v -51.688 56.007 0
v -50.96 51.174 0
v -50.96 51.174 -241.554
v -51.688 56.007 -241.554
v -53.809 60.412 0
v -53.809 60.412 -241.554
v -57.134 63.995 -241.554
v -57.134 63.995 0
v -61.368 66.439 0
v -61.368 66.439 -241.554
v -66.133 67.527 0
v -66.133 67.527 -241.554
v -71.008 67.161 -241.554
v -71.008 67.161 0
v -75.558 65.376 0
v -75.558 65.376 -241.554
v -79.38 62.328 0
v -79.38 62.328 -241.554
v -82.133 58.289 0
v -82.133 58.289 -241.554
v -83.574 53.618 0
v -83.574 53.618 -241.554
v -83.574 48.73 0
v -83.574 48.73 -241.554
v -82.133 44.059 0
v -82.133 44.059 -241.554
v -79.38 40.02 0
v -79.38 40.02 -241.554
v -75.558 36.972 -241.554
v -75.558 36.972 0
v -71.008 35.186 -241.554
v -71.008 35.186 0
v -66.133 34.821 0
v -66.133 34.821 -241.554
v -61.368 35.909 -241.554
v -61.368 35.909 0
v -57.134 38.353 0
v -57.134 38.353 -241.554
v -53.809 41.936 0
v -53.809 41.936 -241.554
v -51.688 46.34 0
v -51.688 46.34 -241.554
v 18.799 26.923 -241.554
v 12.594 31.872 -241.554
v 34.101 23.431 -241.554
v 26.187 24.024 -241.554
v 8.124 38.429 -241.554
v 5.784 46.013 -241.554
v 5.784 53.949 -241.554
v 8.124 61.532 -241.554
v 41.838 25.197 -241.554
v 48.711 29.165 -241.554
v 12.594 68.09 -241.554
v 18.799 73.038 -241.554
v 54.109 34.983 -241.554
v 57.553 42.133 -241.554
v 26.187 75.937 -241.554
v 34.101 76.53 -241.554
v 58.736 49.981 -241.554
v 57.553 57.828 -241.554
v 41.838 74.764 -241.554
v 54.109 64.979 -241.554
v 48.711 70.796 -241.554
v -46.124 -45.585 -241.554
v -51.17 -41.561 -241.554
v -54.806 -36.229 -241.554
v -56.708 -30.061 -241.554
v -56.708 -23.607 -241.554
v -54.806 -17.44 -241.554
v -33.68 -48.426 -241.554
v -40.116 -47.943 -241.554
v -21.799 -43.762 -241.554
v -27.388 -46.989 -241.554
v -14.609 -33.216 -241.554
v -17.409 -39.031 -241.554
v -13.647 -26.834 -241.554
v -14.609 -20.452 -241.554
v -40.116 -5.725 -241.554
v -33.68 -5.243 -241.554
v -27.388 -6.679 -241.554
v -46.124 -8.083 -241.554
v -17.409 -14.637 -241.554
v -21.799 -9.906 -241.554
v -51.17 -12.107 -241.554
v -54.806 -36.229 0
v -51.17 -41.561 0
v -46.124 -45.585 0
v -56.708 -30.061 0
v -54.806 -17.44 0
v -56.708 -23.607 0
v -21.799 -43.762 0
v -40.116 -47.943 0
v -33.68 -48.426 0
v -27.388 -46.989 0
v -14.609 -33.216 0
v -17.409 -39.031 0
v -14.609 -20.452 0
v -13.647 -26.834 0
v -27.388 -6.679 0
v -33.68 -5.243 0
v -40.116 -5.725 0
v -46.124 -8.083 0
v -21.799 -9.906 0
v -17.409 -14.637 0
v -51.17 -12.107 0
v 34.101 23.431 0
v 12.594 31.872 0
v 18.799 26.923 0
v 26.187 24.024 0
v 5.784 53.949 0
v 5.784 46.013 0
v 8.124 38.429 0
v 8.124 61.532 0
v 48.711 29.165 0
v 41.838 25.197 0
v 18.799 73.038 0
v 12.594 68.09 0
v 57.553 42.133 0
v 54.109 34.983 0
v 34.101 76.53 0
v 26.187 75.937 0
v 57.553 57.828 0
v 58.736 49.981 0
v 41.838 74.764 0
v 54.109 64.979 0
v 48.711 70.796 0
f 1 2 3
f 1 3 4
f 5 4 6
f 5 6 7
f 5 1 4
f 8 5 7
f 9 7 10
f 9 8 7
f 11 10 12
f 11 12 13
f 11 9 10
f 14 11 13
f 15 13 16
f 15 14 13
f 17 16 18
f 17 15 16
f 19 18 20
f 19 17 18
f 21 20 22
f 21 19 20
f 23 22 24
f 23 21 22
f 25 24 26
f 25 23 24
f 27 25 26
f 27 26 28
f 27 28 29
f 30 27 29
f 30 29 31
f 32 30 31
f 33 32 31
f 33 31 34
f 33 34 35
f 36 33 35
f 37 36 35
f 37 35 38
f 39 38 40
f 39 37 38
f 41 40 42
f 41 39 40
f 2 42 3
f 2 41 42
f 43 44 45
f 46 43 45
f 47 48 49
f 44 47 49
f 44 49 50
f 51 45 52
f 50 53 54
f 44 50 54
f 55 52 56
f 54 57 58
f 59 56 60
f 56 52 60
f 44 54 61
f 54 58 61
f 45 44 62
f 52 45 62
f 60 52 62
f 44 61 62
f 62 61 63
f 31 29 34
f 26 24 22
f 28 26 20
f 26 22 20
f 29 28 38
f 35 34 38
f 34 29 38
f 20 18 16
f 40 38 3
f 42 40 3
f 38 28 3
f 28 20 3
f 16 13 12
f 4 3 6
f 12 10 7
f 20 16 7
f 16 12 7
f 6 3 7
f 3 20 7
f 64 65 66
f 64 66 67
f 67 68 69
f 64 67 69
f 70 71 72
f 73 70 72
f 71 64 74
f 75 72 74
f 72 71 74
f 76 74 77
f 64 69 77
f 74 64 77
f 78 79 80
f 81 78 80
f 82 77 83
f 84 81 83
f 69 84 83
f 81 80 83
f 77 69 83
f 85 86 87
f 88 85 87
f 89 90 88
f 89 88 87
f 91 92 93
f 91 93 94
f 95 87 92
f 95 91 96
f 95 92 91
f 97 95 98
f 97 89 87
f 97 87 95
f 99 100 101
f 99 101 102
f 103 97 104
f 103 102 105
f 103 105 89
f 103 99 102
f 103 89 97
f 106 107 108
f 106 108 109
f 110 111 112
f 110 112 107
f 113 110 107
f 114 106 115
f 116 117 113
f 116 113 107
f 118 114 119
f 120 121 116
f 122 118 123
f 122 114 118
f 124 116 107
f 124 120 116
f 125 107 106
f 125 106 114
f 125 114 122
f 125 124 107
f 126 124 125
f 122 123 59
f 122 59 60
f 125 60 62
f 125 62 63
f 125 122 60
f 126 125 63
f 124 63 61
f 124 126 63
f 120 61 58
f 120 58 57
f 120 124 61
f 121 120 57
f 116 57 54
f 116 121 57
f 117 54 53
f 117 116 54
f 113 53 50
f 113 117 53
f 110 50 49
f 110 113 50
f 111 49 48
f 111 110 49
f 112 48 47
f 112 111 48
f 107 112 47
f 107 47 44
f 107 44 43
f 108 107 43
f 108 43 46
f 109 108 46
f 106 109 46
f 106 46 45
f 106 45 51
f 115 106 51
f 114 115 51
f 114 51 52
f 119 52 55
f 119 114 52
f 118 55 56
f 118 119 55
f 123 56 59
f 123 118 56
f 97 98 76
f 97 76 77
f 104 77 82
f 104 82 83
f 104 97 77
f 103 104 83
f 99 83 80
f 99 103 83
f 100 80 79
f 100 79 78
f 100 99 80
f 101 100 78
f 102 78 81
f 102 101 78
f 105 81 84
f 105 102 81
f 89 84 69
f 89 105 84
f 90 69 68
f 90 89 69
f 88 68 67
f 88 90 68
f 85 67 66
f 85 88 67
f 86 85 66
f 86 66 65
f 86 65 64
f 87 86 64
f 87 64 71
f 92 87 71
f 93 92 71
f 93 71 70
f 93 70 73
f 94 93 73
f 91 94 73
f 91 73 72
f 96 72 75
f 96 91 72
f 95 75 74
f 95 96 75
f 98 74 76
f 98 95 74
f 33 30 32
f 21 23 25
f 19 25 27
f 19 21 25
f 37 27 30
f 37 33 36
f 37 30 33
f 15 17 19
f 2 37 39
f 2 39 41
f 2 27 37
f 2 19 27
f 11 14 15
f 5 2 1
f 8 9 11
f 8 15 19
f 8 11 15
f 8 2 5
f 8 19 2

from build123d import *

# Parameters (mm, degrees)
F0_R     = 16.398708
F0_R_2   = 26.624277
F0_R_3   = 21.651777
F1_DEPTH = 241.554


with BuildPart() as f1:
    # F0 (on Top) → F1 (new body)
    with BuildSketch(Plane.XY):
        with Locations((-67.358635, 51.17381)):
            Circle(F0_R)
        with Locations((32.111377, 49.980644)):
            Circle(F0_R_2)
        with Locations((-35.298418, -26.834354)):
            Circle(F0_R_3)
    extrude(amount=-F1_DEPTH)


solid = f1.part
